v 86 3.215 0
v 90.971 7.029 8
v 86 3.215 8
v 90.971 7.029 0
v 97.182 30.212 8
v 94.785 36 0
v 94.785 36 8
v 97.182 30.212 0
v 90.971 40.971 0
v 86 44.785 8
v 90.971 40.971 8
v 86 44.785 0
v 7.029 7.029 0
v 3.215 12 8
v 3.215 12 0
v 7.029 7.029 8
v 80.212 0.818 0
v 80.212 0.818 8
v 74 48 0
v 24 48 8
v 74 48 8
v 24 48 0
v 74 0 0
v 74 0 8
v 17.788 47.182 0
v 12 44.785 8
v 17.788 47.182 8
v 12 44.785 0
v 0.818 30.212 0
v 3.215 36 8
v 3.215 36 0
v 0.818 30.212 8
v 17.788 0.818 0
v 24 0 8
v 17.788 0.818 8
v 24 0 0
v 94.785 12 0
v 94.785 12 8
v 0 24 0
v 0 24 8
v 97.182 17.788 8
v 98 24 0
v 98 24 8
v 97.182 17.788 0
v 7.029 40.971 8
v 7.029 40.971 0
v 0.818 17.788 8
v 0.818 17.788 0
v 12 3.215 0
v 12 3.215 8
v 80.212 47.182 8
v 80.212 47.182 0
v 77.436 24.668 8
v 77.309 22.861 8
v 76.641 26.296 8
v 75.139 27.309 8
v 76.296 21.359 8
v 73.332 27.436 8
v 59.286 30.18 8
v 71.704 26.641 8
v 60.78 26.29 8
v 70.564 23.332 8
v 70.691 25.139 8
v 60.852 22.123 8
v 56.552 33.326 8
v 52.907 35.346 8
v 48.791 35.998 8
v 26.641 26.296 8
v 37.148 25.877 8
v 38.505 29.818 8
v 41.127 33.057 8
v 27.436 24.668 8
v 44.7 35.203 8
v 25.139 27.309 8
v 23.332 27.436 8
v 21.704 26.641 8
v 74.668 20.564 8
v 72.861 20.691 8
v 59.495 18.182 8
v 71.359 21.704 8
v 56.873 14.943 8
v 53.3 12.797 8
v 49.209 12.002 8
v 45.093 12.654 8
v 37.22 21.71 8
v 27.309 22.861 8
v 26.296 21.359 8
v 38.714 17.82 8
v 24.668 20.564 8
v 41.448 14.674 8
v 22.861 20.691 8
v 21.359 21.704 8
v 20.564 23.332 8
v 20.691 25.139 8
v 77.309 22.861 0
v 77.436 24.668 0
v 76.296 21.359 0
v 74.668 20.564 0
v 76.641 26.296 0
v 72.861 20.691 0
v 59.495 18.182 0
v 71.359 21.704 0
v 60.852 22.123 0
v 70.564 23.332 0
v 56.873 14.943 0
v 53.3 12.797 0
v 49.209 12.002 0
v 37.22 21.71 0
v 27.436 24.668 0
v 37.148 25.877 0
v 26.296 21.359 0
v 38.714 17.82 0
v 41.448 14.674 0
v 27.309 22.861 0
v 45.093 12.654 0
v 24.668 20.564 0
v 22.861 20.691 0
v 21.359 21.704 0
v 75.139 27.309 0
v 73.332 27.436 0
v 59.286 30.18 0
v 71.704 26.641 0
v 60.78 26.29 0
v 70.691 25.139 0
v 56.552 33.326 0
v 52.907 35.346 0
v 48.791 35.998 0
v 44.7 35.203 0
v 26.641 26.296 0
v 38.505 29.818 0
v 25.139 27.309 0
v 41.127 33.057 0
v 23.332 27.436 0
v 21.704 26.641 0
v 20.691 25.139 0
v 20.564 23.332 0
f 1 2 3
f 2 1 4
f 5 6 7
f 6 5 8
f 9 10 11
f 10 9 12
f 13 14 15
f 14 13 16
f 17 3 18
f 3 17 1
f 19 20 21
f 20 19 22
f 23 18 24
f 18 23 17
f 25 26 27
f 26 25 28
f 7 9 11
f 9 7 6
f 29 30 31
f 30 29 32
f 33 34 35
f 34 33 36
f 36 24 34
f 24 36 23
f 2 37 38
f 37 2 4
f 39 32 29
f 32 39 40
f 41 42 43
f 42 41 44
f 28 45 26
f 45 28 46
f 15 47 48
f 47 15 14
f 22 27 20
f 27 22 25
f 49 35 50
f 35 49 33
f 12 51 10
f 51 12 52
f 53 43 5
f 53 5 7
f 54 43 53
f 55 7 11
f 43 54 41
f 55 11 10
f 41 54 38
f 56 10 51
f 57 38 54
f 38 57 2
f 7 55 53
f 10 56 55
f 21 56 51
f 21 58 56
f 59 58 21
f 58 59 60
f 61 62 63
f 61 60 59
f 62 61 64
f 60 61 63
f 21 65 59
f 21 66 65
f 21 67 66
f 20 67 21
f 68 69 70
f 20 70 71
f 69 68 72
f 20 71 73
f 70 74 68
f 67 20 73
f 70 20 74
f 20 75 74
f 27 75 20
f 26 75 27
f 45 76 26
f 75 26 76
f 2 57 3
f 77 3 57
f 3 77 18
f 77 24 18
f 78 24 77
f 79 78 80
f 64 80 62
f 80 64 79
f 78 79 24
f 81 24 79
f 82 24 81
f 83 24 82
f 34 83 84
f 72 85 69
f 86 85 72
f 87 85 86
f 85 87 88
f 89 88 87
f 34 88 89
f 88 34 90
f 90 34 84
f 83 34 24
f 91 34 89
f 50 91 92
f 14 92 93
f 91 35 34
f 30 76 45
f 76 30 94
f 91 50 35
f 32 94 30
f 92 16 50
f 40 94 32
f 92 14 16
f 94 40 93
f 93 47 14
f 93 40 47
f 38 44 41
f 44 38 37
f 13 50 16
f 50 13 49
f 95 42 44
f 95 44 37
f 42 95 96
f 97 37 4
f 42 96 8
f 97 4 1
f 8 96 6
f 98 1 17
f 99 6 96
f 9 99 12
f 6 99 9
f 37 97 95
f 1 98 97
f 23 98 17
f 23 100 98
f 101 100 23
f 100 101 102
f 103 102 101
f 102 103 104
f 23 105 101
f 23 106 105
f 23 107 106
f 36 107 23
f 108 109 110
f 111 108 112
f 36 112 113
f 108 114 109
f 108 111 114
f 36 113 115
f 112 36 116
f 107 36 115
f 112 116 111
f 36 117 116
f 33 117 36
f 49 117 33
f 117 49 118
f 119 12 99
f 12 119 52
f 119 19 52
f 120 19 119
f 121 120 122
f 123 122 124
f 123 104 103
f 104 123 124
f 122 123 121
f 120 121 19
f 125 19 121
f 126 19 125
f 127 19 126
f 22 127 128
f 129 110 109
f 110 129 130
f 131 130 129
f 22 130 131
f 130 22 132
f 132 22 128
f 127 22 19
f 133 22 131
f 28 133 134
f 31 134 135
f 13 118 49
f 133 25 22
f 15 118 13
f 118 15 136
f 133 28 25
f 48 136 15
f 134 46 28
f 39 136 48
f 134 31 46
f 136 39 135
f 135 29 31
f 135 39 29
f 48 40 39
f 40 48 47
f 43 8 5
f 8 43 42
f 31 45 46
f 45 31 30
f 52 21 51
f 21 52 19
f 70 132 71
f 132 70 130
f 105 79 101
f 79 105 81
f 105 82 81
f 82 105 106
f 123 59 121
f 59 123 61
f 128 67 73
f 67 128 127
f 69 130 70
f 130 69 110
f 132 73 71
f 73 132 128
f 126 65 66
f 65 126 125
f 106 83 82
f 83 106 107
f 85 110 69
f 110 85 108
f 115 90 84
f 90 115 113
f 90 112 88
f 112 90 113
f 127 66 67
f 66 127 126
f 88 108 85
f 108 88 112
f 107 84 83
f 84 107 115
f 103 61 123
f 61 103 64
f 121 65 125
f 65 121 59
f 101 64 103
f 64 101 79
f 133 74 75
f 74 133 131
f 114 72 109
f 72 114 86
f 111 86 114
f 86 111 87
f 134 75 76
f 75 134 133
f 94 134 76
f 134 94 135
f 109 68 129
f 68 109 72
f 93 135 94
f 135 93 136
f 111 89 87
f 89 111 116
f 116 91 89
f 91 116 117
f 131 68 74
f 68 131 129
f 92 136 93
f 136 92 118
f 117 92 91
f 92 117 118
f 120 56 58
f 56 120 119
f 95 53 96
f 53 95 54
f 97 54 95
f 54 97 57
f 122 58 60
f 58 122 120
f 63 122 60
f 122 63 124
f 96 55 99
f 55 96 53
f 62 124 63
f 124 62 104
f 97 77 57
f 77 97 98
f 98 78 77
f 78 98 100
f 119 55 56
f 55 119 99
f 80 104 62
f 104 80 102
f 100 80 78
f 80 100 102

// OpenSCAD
$fn = 32;

// ----------------------------------------------------------------------
// Spacer plate: obround span 50, caps R24
// ----------------------------------------------------------------------

// --- parameters (mm) ---
bore_r = 12;              // centre bore radius
bolt_r = 3.5;             // bolt hole radius
plate_t = 8;              // plate thickness, Z (extrusion height)
span = 50;                // obround span
cap_r = 24;               // cap radius
fit_tol = 0.05;           // declared fit tolerance (prompt contract)
free_tol = 0.2;           // declared free tolerance (prompt contract)

profile = [[24, 48], [17.788, 47.182], [12, 44.785], [7.029, 40.971], [3.215, 36], [0.818, 30.212], [0, 24], [0.818, 17.788], [3.215, 12], [7.029, 7.029], [12, 3.215], [17.788, 0.818], [24, 0], [74, 0], [80.212, 0.818], [86, 3.215], [90.971, 7.029], [94.785, 12], [97.182, 17.788], [98, 24], [97.182, 30.212], [94.785, 36], [90.971, 40.971], [86, 44.785], [80.212, 47.182], [74, 48]];  // primary outline, 26 points, counter clockwise
void_1 = [[60.78, 26.29], [59.286, 30.18], [56.552, 33.326], [52.907, 35.346], [48.791, 35.998], [44.7, 35.203], [41.127, 33.057], [38.505, 29.818], [37.148, 25.877], [37.22, 21.71], [38.714, 17.82], [41.448, 14.674], [45.093, 12.654], [49.209, 12.002], [53.3, 12.797], [56.873, 14.943], [59.495, 18.182], [60.852, 22.123]];  // centre bore, 18 points
void_2 = [[27.436, 24.668], [26.641, 26.296], [25.139, 27.309], [23.332, 27.436], [21.704, 26.641], [20.691, 25.139], [20.564, 23.332], [21.359, 21.704], [22.861, 20.691], [24.668, 20.564], [26.296, 21.359], [27.309, 22.861]];  // end hole, 12 points
void_3 = [[77.436, 24.668], [76.641, 26.296], [75.139, 27.309], [73.332, 27.436], [71.704, 26.641], [70.691, 25.139], [70.564, 23.332], [71.359, 21.704], [72.861, 20.691], [74.668, 20.564], [76.296, 21.359], [77.309, 22.861]];  // end hole, 12 points

// --- the one profile operation ---
difference() {
  linear_extrude(height = plate_t) polygon(points = profile);
  translate([0, 0, -1])
    linear_extrude(height = plate_t + 2) polygon(points = void_1);
  translate([0, 0, -1])
    linear_extrude(height = plate_t + 2) polygon(points = void_2);
  translate([0, 0, -1])
    linear_extrude(height = plate_t + 2) polygon(points = void_3);
}
